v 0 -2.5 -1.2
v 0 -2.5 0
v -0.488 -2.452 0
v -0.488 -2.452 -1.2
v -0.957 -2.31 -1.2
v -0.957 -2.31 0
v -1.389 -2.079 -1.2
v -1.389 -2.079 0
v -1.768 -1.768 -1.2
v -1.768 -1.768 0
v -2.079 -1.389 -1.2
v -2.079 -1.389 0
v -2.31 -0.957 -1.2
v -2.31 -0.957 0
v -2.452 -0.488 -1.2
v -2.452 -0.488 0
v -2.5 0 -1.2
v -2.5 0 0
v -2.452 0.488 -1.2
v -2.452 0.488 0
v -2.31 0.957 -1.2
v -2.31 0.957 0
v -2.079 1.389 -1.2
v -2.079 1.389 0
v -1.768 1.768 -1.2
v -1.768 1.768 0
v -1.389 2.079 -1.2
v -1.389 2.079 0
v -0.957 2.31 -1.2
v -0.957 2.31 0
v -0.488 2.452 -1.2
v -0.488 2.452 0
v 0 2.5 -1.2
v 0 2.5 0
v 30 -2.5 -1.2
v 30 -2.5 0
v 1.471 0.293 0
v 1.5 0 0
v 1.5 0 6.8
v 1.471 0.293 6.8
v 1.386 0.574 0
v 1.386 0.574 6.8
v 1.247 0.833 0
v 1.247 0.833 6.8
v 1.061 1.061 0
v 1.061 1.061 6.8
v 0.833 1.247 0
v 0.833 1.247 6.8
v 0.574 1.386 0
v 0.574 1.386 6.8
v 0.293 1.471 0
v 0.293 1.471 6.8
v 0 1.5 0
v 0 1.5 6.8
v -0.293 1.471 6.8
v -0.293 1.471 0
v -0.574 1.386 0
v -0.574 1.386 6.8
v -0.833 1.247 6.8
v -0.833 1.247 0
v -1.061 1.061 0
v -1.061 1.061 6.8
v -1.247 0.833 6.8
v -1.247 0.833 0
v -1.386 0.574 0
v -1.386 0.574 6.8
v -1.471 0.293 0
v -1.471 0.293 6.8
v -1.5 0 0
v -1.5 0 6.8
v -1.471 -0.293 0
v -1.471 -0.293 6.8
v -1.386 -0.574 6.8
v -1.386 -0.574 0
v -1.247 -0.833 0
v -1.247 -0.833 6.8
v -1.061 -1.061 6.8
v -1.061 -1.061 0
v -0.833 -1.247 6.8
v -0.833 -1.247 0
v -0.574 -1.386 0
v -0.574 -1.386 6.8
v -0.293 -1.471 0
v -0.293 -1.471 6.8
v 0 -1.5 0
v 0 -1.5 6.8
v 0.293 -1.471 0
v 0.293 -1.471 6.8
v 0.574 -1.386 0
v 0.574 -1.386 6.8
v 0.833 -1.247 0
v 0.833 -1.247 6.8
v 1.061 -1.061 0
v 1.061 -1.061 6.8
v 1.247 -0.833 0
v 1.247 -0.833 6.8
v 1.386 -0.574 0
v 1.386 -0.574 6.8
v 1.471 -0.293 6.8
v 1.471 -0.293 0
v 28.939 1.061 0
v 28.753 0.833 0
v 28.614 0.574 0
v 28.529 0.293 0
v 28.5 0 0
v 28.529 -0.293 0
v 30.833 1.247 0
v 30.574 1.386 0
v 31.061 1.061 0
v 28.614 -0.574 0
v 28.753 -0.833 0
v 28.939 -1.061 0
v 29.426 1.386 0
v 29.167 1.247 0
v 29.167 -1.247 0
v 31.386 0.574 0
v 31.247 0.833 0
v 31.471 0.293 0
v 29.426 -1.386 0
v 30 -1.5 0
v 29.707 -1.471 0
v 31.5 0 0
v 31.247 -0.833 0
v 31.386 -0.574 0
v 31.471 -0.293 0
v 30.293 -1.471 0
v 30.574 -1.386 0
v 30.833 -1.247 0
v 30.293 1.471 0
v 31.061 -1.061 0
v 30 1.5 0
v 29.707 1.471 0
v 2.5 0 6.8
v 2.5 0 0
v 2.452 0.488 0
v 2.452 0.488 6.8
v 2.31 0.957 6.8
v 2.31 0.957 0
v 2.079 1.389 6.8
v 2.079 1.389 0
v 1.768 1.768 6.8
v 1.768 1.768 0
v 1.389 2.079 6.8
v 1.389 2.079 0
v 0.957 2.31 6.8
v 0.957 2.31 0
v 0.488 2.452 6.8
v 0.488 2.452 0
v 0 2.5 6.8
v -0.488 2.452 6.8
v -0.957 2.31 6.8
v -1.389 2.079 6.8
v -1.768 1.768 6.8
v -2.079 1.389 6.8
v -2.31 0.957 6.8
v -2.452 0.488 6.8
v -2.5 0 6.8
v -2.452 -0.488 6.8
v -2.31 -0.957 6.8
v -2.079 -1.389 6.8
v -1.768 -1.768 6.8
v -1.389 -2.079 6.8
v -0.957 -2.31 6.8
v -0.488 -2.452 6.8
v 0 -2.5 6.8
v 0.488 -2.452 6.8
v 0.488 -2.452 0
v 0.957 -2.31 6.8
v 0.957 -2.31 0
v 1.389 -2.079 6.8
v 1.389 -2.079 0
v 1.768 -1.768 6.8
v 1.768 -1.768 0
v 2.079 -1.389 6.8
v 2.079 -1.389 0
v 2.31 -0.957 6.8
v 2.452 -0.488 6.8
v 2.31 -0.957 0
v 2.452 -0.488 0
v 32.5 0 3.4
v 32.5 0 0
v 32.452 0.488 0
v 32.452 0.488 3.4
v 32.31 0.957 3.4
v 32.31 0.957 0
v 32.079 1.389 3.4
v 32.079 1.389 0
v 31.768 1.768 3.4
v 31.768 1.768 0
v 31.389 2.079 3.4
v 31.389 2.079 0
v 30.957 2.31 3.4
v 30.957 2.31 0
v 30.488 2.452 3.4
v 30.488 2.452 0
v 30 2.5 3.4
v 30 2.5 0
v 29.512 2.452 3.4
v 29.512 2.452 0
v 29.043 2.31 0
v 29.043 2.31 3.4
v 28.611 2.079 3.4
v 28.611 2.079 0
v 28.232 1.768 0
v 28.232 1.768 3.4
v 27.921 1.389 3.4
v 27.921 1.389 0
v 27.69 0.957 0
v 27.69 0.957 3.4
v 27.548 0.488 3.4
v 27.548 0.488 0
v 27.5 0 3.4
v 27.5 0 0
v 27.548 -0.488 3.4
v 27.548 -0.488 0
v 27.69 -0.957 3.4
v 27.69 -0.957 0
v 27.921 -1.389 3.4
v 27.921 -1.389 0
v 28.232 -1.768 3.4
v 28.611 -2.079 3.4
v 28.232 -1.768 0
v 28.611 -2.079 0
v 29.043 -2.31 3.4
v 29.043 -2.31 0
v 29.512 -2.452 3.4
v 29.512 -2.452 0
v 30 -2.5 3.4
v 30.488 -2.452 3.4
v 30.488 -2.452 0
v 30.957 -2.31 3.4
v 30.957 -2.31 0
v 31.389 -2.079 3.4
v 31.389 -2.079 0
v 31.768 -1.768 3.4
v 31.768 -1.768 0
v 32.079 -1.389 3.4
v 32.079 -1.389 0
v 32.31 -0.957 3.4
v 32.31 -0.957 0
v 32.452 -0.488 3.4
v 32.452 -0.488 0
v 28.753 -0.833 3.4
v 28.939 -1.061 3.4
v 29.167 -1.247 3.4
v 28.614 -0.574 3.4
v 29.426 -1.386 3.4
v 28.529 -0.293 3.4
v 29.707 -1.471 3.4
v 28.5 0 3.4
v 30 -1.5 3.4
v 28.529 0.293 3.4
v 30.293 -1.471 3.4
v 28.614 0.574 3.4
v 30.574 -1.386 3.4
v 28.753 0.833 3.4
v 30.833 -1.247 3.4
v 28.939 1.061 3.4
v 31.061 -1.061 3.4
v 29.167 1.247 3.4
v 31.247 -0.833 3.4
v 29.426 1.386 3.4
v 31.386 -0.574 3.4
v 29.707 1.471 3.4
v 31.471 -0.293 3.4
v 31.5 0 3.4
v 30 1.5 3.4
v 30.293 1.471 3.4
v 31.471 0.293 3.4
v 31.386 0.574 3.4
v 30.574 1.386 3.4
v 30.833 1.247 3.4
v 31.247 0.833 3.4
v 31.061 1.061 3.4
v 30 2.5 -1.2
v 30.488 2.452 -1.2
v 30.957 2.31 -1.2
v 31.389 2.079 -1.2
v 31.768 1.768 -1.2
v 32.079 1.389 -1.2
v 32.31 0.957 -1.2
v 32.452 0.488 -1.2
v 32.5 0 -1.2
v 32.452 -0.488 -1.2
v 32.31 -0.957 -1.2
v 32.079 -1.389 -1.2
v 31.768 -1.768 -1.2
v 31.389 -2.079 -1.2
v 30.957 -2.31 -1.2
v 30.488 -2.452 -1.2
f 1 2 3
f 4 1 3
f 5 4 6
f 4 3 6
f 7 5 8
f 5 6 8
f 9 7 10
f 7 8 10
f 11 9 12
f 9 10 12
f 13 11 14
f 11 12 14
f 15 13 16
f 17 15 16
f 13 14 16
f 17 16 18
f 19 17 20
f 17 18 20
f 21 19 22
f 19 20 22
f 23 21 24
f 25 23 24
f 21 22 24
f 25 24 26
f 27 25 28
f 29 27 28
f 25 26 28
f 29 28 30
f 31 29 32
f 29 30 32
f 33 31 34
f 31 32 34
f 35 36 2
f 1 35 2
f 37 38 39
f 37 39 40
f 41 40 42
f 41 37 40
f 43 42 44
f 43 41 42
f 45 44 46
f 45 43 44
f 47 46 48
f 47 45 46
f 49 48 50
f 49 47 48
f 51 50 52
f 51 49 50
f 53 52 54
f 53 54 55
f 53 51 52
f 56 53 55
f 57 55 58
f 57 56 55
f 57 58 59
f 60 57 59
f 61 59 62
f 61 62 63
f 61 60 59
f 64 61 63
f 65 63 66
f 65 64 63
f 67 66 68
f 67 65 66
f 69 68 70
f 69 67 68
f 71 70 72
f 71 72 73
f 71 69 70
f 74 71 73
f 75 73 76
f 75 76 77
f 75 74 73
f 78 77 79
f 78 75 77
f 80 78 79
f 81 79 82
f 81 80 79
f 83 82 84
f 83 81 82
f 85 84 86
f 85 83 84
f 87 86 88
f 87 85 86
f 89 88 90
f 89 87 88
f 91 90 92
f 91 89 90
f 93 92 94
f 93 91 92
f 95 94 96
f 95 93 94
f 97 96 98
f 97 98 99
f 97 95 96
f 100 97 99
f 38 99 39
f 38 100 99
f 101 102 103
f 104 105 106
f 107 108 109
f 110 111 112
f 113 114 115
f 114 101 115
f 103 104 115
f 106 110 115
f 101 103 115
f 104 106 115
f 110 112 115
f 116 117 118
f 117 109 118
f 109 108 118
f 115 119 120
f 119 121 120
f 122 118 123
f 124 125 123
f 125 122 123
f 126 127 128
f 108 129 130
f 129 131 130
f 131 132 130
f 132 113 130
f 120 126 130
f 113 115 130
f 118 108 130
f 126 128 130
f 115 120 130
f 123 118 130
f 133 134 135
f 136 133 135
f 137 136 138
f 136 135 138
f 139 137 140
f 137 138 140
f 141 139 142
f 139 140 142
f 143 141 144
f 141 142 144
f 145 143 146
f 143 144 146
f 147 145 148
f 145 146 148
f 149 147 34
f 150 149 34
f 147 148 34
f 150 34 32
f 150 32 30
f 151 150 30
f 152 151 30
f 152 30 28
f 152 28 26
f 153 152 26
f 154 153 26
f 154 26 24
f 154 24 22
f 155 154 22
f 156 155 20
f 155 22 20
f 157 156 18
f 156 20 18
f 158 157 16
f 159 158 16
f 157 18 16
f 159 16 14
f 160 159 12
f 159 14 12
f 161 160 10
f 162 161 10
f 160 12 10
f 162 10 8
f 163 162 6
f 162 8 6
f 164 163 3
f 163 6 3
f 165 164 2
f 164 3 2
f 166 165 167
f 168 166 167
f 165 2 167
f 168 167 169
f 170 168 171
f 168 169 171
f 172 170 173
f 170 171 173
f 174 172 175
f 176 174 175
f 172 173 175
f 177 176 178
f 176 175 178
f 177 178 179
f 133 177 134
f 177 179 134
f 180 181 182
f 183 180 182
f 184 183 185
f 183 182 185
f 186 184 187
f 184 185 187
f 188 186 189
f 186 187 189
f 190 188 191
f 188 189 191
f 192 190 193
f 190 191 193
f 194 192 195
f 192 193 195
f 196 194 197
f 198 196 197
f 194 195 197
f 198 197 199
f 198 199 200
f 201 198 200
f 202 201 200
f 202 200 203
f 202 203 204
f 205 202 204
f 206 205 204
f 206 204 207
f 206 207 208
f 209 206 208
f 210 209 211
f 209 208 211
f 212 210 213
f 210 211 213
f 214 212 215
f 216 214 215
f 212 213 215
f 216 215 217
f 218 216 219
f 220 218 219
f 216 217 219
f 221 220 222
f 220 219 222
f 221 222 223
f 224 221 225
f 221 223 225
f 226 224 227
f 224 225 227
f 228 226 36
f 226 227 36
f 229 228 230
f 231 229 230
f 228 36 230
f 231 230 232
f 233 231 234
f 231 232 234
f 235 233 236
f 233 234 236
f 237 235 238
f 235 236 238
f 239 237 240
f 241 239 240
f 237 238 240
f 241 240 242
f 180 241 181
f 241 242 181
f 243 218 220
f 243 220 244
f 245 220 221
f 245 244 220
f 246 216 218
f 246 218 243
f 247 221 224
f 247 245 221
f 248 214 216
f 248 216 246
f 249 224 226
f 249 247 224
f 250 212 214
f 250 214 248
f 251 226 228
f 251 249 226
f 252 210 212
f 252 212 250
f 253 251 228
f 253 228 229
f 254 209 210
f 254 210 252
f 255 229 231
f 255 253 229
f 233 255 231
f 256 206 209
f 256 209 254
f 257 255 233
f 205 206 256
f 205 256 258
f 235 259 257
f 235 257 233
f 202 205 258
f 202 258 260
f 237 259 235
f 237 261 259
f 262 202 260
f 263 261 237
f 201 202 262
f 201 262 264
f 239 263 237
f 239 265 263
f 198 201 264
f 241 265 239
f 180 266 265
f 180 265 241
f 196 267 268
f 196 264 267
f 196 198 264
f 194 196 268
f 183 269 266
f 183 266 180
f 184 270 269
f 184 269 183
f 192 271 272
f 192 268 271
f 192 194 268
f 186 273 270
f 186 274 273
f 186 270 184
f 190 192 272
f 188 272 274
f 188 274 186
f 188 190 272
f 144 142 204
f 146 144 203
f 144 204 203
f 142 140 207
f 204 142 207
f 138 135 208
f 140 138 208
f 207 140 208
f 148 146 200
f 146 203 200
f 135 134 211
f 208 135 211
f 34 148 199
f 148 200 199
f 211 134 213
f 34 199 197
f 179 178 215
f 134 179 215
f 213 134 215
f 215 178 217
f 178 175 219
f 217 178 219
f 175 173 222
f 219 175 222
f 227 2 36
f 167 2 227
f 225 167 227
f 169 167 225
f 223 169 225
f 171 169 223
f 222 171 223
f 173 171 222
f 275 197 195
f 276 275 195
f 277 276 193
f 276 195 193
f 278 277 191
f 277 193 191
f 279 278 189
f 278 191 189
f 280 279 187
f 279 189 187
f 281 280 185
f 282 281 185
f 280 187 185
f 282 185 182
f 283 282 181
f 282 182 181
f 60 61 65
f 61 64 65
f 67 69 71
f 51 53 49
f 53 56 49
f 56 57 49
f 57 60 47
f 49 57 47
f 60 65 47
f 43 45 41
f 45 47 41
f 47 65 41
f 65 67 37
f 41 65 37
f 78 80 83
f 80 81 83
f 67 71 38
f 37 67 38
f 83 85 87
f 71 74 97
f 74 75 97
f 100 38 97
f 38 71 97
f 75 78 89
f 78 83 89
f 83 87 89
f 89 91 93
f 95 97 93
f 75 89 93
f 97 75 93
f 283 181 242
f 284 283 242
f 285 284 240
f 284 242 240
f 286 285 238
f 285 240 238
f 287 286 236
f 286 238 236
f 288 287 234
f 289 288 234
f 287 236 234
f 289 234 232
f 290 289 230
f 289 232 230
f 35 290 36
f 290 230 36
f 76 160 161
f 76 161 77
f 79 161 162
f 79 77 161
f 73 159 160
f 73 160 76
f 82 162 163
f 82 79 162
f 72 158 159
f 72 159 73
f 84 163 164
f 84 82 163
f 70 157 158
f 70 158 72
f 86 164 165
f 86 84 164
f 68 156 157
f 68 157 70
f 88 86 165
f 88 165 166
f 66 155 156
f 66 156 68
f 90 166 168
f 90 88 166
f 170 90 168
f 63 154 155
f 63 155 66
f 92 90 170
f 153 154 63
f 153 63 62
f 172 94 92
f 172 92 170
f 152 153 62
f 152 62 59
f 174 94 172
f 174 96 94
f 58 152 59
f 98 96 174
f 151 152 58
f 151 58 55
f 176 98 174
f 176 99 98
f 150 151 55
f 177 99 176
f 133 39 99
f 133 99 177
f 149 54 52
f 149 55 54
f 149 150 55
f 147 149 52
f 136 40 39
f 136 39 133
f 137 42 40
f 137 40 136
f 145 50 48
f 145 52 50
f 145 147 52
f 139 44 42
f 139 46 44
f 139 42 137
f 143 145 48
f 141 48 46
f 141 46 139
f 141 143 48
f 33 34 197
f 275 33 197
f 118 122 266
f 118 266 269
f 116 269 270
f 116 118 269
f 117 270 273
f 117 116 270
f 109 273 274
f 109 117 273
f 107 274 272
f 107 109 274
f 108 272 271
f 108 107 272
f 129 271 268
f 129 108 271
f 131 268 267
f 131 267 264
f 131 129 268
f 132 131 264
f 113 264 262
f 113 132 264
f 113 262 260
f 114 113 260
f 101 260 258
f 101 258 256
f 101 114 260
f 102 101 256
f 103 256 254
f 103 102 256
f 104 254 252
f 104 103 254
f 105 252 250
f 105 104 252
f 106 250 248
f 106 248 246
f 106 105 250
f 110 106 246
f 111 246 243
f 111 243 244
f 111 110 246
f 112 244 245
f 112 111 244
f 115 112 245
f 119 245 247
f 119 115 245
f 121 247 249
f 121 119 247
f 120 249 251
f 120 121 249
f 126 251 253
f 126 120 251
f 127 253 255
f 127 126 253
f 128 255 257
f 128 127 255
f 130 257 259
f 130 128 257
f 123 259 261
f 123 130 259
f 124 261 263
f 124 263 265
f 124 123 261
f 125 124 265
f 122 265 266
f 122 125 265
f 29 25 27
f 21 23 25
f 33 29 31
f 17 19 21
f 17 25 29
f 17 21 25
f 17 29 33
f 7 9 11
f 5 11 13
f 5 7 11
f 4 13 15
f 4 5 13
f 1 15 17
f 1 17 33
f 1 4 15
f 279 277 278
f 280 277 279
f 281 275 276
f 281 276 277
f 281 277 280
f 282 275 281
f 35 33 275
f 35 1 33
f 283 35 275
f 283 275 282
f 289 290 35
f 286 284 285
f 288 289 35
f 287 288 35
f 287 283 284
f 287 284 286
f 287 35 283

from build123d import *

# Parameters (mm, degrees)
F0_R     = 2.5
F0_R_2   = 1.5
F1_DEPTH = 6.8
F2_R     = 1.5
F3_DEPTH = 1.2
F4_R     = 2.5
F4_R_2   = 1.5
F5_DEPTH = 3.4


with BuildPart() as f1:
    # F0 (on Top) → F1 (new body)
    with BuildSketch(Plane.XY):
        Circle(F0_R)
        Circle(F0_R_2, mode=Mode.SUBTRACT)
    extrude(amount=F1_DEPTH)

    # F2 (on face) → F3 (join)
    with BuildSketch(Plane(origin=(0, 0, 0), x_dir=(1, 0, 0), z_dir=(0, 0, -1))):
        with BuildLine():
            ThreePointArc((30, -2.5), (31.767767, -1.767767), (32.5, 0))
            ThreePointArc((32.5, 0), (31.767767, 1.767767), (30, 2.5))
            ThreePointArc((30, 2.5), (27.5, 0), (30, -2.5))
        make_face()
        with BuildLine():
            ThreePointArc((2.5, 0), (1.767767, 1.767767), (0, 2.5))
            ThreePointArc((0, 2.5), (-2.5, 0), (0, -2.5))
            ThreePointArc((0, -2.5), (1.767767, -1.767767), (2.5, 0))
        make_face()
        Circle(F2_R, mode=Mode.SUBTRACT)
        Circle(F2_R)
        with BuildLine():
            Line((30, 2.5), (0, 2.5))
            ThreePointArc((0, 2.5), (1.767767, 1.767767), (2.5, 0))
            ThreePointArc((2.5, 0), (1.767767, -1.767767), (0, -2.5))
            Line((0, -2.5), (30, -2.5))
            ThreePointArc((30, -2.5), (27.5, 0), (30, 2.5))
        make_face()
    extrude(amount=F3_DEPTH)

    # F4 (on face) → F5 (join)
    with BuildSketch(Plane.XY):
        with Locations((30, 0)):
            Circle(F4_R)
        with Locations((30, 0)):
            Circle(F4_R_2, mode=Mode.SUBTRACT)
    extrude(amount=F5_DEPTH)


solid = f1.part
